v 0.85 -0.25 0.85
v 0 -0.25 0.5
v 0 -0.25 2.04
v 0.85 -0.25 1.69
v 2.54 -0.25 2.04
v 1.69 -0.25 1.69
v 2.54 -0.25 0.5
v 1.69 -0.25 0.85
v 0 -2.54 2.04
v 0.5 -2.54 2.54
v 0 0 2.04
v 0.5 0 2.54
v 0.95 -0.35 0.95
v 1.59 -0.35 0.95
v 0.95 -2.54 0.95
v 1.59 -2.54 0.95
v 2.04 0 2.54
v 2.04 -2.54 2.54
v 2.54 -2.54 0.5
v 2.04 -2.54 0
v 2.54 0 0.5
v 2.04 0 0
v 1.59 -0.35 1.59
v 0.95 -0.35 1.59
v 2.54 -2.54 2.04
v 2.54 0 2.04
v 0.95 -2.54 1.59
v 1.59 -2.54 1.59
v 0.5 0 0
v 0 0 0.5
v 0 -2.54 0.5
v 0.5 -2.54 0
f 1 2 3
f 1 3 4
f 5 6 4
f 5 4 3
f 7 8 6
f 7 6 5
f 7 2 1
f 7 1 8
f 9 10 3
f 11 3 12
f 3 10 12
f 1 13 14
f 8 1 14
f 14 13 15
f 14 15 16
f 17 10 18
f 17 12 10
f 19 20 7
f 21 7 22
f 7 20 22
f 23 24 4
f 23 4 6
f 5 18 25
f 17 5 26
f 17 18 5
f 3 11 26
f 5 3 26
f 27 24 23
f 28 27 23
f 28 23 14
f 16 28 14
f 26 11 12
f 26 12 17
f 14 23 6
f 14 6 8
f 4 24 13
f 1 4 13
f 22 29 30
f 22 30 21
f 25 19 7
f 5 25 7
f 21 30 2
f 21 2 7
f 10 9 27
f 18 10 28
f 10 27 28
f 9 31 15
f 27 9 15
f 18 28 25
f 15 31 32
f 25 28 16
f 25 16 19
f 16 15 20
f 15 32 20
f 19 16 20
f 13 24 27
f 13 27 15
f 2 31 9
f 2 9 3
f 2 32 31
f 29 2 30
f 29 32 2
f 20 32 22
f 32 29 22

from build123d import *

# Parameters (mm, degrees)
SKETCH1_W           = 2.54
SKETCH1_H           = 2.54
BOSS_EXTRUDE1_DEPTH = 2.54
CHAMFER1_SIZE       = 0.5
SKETCH2_W           = 2.54
SKETCH2_H           = 1.54
CUT_EXTRUDE6_DEPTH  = 0.25
SKETCH3_W           = 0.64
SKETCH3_H           = 0.64
CUT_EXTRUDE7_DEPTH  = 3
CHAMFER4_SIZE       = 0.1


with BuildPart() as part:
    # Sketch1 → Boss-Extrude1 (new body)
    with BuildSketch(Plane.XY):
        with Locations((1.27, -1.27)):
            Rectangle(SKETCH1_W, SKETCH1_H)
    extrude(amount=BOSS_EXTRUDE1_DEPTH)

    # Chamfer1
    chamfer1_edges = [part.edges().sort_by_distance(p)[0] for p in [
        (2.54, -1.27, 2.54),
        (0, -1.27, 2.54),
        (2.54, -1.27, 0),
        (0, -1.27, 0),
    ]]
    chamfer(chamfer1_edges, length=CHAMFER1_SIZE)

    # Sketch2 → Cut-Extrude6 (cut)
    with BuildSketch(Plane(origin=(0, 0, 0), x_dir=(1, 0, 0), z_dir=(0, 1, 0))):
        with Locations((1.27, -1.27)):
            Rectangle(SKETCH2_W, SKETCH2_H)
    extrude(amount=-CUT_EXTRUDE6_DEPTH, mode=Mode.SUBTRACT)

    # Sketch3 → Cut-Extrude7 (cut)
    with BuildSketch(Plane(origin=(0, -0.25, 0), x_dir=(1, 0, 0), z_dir=(0, 1, 0))):
        with Locations((1.27, -1.27)):
            Rectangle(SKETCH3_W, SKETCH3_H)
    extrude(amount=-CUT_EXTRUDE7_DEPTH, mode=Mode.SUBTRACT)

    # Chamfer4
    chamfer4_edges = [part.edges().sort_by_distance(p)[0] for p in [
        (1.59, -0.25, 1.27),
        (1.27, -0.25, 0.95),
        (0.95, -0.25, 1.27),
        (1.27, -0.25, 1.59),
    ]]
    chamfer(chamfer4_edges, length=CHAMFER4_SIZE)


solid = part.part
